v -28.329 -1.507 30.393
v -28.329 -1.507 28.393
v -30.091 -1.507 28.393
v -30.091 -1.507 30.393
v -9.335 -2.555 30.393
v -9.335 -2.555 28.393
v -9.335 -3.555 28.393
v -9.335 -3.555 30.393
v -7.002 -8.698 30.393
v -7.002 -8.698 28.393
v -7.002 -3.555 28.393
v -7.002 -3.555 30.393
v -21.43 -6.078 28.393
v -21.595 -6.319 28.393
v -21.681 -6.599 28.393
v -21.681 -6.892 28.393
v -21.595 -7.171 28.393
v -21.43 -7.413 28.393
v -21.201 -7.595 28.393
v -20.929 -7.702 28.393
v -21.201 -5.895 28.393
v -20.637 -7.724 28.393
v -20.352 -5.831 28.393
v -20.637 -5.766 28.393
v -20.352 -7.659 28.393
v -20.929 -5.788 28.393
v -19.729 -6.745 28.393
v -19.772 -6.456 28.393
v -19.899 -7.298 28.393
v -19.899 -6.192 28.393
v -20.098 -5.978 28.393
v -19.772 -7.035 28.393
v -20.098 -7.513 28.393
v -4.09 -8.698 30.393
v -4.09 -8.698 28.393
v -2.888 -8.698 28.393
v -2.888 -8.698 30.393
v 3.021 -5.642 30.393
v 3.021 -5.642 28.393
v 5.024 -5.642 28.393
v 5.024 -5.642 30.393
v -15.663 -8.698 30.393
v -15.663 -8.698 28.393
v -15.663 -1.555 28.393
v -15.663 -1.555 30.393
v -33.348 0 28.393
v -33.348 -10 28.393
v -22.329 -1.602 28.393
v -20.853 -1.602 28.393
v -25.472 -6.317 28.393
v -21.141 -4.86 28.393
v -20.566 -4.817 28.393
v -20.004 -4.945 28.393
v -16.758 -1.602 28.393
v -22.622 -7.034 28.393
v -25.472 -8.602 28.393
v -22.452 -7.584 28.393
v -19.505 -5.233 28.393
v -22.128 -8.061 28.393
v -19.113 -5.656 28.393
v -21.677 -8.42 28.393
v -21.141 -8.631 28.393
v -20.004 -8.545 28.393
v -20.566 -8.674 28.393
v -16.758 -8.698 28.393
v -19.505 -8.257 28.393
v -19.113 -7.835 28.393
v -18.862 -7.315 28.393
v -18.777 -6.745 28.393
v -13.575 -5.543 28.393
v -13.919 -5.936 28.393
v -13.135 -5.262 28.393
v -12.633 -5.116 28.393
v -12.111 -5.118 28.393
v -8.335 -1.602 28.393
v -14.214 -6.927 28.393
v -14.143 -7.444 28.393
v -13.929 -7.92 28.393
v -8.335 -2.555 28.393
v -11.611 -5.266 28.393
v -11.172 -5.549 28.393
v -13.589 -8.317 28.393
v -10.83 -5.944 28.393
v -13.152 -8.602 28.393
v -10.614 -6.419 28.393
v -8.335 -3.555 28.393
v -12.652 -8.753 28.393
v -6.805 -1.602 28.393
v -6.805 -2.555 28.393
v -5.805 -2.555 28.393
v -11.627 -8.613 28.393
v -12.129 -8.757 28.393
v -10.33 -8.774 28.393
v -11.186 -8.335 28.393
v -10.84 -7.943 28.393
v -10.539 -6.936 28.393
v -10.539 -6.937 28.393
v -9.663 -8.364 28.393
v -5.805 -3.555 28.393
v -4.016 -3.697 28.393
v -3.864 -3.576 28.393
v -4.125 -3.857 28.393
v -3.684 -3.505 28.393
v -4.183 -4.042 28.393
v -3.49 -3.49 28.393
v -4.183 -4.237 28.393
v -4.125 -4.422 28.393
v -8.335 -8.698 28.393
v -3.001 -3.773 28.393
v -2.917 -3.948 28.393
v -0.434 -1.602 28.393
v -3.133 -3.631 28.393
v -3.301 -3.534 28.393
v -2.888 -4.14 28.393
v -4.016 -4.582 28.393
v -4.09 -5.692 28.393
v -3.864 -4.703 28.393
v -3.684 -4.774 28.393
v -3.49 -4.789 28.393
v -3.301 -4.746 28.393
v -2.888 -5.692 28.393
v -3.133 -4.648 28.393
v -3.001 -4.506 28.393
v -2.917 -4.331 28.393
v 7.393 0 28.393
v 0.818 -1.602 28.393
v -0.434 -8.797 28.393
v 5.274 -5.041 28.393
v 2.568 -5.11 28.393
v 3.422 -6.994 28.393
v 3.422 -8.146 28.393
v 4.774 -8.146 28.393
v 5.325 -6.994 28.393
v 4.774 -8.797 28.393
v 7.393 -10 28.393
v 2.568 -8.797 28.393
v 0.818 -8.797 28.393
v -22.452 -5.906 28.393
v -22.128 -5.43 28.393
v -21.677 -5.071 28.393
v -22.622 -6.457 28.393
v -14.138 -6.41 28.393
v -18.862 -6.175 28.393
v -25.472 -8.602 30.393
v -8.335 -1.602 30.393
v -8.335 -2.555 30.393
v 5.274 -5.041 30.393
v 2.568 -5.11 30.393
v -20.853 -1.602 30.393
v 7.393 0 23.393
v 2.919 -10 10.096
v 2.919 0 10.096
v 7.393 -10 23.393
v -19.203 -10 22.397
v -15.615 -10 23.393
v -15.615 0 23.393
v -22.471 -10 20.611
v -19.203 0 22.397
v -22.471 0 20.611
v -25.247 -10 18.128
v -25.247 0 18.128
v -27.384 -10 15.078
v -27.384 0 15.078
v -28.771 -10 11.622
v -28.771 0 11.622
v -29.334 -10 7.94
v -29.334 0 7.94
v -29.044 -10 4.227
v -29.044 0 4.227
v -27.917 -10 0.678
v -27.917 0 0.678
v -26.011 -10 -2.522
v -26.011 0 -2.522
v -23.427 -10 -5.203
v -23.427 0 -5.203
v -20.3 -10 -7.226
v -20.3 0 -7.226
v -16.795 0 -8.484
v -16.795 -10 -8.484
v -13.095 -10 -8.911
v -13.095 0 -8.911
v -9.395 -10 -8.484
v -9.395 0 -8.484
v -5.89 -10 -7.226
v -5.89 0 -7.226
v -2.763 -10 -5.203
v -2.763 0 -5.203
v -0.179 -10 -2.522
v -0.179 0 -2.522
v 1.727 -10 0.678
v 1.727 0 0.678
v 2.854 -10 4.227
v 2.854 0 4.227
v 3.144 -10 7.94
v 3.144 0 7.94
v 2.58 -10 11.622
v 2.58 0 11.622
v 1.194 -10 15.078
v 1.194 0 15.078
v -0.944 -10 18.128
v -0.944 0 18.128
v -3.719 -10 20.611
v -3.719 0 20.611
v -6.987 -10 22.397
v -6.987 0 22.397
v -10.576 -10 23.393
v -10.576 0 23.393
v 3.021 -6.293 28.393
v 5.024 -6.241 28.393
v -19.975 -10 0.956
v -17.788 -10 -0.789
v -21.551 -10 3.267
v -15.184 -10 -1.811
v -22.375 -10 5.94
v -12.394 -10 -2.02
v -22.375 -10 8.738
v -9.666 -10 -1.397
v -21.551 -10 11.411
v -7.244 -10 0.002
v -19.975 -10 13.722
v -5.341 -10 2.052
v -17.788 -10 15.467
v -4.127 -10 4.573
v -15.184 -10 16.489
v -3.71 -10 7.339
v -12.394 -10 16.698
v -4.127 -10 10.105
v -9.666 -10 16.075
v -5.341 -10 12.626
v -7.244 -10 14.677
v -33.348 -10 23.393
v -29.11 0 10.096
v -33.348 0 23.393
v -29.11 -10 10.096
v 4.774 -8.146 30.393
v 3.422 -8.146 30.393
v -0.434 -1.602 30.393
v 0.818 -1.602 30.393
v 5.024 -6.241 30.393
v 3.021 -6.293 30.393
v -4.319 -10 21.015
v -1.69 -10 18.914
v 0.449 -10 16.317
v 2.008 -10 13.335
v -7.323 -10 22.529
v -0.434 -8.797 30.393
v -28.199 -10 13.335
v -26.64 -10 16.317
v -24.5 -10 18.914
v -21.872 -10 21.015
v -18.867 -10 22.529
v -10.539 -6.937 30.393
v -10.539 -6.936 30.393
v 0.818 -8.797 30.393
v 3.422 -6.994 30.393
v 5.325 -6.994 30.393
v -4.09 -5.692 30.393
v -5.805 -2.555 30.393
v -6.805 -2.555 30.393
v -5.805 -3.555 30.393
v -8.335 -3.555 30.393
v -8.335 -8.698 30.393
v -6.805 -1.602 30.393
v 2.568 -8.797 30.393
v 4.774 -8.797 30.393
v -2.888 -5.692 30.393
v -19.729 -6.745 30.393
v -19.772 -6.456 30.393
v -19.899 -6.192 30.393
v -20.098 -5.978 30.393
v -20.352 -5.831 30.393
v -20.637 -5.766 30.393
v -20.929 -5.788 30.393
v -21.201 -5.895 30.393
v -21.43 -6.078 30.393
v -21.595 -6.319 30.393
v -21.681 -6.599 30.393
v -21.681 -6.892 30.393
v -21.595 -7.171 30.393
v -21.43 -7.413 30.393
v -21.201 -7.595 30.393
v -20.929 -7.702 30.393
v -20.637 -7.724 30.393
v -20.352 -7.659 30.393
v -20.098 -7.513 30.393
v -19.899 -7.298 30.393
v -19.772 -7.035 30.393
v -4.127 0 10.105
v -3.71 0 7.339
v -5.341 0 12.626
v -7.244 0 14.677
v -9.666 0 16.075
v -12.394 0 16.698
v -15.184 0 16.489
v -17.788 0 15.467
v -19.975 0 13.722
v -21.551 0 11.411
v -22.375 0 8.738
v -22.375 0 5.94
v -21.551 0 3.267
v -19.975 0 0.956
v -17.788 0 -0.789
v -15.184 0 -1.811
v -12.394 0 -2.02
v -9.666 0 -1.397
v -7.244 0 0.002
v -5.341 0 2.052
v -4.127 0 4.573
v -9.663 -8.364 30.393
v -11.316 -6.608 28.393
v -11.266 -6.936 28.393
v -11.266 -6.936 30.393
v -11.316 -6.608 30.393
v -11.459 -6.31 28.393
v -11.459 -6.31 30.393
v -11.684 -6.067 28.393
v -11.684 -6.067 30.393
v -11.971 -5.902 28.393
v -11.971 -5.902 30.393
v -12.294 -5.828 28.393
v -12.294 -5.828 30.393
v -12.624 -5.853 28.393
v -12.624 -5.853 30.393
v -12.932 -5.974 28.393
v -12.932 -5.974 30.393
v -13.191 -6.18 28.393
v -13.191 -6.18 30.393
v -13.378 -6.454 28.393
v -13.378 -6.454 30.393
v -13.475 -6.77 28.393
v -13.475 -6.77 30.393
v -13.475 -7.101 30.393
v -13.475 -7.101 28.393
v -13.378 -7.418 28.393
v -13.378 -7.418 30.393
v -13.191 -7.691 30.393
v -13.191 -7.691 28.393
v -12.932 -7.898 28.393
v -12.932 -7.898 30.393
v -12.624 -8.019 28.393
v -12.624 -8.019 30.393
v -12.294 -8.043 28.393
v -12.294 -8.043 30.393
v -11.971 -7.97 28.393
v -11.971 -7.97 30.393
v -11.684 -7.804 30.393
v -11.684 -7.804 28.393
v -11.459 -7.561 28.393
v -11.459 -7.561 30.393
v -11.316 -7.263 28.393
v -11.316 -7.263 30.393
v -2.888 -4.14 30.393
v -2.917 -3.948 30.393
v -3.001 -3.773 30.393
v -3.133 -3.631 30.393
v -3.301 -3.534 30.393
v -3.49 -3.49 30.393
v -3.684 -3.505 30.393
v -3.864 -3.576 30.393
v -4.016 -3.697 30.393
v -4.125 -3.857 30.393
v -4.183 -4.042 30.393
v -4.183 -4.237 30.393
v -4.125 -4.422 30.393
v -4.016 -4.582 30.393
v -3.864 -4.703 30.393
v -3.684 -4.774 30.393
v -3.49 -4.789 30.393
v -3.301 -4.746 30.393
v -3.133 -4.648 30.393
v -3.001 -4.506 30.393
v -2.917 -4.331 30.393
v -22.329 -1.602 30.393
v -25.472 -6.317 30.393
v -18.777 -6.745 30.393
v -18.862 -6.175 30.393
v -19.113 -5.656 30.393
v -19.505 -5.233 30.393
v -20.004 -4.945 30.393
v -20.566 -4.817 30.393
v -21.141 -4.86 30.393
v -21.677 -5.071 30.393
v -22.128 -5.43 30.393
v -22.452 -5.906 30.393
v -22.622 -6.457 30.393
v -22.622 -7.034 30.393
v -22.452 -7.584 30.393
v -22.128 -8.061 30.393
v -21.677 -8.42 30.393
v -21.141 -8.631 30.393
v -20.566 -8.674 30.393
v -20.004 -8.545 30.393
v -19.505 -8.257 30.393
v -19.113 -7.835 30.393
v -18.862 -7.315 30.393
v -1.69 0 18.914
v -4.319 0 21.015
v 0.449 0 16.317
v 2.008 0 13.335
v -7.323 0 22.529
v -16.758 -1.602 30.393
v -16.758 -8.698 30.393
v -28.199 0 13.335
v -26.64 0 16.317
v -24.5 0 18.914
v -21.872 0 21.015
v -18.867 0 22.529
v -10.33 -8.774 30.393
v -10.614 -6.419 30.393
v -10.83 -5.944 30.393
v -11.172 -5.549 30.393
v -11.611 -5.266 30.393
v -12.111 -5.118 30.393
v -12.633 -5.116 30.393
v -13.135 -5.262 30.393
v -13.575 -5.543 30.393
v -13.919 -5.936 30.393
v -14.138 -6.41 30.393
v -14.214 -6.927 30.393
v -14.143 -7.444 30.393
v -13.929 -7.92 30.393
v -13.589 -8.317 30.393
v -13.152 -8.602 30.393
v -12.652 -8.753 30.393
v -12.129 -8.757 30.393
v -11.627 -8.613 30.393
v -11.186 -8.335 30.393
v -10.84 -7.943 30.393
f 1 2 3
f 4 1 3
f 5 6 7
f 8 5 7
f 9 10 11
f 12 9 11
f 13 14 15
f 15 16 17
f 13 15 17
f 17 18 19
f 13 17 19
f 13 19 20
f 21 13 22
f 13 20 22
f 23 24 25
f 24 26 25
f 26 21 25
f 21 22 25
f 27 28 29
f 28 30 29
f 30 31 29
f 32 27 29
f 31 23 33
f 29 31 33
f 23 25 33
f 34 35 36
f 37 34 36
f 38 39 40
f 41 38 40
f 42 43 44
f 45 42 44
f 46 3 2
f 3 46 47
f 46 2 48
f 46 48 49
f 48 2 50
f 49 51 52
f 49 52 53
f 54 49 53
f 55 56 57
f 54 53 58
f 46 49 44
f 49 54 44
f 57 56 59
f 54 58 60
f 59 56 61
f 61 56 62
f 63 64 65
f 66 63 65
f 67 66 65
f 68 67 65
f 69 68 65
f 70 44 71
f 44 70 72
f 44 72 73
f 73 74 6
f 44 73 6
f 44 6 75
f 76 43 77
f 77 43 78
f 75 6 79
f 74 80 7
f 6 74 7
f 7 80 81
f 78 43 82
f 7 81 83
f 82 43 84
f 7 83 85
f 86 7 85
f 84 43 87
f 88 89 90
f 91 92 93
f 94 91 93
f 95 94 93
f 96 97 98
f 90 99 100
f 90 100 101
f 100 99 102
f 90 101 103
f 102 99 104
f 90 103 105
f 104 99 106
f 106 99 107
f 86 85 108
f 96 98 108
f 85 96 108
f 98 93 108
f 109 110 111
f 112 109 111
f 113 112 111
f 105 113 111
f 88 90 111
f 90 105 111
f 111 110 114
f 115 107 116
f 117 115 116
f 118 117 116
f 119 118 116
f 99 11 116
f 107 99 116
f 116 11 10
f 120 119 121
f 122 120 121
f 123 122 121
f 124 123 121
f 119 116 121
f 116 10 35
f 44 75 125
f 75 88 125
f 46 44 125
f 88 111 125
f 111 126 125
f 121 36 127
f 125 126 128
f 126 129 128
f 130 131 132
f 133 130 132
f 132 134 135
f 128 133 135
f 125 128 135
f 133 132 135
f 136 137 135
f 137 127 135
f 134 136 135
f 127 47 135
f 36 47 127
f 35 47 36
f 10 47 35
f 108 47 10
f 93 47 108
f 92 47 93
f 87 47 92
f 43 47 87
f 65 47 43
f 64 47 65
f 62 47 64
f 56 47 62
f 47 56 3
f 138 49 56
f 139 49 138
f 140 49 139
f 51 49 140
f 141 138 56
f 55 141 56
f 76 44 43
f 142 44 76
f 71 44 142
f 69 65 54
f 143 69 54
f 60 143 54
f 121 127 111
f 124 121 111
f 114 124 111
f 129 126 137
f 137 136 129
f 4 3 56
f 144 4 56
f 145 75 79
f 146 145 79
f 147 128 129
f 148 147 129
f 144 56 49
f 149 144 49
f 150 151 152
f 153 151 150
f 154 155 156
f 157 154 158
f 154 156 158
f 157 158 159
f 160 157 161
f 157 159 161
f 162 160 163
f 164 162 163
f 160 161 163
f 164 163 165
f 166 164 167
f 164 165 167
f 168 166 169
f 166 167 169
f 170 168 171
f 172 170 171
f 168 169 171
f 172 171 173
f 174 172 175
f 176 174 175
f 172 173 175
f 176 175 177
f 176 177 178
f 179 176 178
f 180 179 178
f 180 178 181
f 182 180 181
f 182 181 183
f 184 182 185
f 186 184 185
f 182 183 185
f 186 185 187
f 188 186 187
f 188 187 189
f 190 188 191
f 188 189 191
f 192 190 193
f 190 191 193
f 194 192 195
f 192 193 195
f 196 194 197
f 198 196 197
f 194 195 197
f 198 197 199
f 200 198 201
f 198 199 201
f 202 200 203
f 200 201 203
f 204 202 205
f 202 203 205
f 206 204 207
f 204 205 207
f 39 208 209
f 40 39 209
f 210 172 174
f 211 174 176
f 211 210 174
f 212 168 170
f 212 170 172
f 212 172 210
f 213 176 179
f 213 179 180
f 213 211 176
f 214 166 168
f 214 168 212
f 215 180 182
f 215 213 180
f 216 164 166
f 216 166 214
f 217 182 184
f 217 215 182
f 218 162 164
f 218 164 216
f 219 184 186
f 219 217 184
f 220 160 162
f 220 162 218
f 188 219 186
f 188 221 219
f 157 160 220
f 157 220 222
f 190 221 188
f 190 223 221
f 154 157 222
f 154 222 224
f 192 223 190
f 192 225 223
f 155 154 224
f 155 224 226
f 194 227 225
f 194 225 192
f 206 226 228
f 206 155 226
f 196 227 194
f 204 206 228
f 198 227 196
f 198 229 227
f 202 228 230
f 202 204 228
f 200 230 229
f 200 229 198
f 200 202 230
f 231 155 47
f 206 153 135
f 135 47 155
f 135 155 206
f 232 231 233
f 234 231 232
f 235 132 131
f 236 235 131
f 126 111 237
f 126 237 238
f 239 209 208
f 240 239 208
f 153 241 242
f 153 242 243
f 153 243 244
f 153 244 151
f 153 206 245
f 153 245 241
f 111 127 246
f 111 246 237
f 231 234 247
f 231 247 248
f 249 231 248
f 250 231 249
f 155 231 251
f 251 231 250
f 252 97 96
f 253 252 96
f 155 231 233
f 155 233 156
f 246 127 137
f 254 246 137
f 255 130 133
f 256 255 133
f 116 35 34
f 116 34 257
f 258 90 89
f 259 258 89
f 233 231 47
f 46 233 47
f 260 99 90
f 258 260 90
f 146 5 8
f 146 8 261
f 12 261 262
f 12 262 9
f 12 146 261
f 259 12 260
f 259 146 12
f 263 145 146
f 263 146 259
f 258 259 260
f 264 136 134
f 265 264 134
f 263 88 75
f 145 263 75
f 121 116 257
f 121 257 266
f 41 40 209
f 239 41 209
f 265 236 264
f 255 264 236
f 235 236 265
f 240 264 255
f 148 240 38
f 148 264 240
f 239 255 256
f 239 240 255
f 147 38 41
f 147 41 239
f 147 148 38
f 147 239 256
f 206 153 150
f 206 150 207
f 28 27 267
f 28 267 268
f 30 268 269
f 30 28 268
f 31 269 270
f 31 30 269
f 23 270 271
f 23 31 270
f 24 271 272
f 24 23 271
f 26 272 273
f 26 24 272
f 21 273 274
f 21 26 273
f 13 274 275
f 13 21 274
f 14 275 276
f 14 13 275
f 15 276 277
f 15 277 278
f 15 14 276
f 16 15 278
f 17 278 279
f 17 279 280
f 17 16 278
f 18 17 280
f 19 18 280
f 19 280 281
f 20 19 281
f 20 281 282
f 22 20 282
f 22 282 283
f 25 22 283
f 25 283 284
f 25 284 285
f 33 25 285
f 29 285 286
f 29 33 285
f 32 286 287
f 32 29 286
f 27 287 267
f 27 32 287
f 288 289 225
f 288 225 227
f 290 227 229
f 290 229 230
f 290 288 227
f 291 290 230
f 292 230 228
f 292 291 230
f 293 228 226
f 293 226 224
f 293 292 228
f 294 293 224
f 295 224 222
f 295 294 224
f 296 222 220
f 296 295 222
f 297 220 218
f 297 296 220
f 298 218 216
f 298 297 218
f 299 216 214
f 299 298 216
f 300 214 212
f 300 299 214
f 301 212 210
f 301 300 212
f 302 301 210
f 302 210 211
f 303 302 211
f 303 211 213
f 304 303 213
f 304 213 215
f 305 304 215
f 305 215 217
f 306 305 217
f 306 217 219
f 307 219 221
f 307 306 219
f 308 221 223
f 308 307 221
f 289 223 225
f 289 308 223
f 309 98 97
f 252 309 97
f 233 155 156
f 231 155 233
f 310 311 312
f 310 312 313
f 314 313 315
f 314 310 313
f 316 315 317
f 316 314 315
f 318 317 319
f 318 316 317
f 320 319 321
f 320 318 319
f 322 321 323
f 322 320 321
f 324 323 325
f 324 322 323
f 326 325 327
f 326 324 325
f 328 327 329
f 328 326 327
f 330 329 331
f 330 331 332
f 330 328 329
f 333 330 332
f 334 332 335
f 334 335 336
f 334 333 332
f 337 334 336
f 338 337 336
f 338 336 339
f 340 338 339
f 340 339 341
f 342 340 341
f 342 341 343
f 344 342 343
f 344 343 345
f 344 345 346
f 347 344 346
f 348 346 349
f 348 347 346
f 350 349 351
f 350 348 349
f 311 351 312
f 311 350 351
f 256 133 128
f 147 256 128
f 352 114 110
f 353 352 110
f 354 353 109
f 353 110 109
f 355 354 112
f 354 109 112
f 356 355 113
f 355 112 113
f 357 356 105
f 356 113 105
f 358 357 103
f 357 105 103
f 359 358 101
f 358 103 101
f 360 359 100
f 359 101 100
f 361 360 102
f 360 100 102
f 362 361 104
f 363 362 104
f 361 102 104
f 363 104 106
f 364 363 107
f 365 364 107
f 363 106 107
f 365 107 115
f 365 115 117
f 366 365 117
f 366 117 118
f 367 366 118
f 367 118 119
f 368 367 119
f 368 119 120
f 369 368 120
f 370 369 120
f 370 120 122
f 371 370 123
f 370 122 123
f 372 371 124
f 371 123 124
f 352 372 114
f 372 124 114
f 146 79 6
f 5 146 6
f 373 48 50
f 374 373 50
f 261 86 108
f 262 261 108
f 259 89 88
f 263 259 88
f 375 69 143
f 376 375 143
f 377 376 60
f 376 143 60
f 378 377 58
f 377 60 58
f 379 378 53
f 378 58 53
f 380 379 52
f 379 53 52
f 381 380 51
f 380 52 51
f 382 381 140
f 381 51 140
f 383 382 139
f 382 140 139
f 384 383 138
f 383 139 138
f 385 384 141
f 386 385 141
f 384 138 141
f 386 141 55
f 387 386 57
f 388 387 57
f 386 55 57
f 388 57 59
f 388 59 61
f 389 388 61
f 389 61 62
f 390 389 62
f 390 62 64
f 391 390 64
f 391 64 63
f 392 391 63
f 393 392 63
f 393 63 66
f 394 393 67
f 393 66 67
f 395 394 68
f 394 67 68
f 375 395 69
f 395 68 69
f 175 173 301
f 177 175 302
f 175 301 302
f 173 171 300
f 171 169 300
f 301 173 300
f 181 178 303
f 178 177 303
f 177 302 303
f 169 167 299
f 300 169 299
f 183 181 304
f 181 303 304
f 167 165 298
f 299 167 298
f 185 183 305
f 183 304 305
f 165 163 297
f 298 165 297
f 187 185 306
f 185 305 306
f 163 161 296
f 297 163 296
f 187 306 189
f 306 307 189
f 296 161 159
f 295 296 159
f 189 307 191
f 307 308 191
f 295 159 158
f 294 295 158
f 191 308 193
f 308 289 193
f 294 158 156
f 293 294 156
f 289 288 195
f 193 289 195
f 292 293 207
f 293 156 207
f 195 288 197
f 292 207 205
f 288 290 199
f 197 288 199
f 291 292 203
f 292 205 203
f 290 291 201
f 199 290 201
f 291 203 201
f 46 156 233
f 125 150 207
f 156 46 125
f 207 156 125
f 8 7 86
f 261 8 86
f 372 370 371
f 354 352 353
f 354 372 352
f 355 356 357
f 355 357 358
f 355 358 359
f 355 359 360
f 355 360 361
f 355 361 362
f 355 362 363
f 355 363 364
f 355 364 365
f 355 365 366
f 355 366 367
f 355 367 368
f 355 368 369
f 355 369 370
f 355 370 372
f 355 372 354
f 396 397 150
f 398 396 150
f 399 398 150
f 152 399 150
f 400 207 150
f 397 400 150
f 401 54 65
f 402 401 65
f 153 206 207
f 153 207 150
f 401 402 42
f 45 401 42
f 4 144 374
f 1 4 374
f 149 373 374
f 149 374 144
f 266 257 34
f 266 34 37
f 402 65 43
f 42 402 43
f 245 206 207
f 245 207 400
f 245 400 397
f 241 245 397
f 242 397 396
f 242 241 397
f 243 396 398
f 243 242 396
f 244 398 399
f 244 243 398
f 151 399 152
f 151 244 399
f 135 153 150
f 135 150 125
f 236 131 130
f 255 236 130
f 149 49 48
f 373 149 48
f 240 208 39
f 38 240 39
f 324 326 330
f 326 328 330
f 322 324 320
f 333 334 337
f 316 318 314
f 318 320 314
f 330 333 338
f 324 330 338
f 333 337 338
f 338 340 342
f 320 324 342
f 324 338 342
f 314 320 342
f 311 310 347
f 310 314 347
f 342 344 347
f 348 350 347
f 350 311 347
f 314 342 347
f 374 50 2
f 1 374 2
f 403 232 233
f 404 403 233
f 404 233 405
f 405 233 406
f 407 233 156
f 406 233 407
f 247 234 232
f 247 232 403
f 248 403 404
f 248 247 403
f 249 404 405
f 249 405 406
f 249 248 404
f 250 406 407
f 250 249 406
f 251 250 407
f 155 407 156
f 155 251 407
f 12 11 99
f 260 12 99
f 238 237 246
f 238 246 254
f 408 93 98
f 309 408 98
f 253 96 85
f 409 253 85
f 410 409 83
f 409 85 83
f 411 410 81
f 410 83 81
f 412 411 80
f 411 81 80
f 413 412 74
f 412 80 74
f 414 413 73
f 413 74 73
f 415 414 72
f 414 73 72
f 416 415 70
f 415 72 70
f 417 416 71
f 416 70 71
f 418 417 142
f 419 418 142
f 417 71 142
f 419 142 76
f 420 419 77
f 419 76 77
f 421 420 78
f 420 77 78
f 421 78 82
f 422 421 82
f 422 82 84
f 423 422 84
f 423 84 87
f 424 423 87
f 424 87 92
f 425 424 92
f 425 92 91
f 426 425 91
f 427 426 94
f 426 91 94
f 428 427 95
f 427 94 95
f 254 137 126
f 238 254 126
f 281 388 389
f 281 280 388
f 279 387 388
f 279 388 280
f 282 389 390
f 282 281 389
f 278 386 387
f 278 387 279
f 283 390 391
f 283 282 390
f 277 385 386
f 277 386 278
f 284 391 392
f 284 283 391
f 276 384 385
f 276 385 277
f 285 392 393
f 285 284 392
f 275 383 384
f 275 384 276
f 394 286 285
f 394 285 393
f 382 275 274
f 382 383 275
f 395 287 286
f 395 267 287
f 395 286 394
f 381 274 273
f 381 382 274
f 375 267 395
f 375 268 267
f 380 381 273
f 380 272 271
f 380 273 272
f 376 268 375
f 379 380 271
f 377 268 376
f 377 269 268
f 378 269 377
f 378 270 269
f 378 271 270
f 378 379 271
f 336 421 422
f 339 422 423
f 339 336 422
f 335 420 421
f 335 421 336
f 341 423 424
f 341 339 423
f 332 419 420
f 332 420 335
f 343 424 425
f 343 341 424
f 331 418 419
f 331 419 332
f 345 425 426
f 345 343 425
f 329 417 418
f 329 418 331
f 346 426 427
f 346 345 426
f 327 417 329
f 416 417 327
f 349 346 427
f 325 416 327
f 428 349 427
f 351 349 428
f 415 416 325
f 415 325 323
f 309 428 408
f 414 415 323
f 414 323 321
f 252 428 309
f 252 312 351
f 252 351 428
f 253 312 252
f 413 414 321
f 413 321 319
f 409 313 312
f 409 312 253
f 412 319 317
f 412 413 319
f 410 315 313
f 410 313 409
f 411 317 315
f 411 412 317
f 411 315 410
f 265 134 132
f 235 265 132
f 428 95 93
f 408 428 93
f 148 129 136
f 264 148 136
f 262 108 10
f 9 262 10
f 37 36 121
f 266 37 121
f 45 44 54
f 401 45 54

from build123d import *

# Parameters (mm, degrees)
F0_R     = 16.25
F0_R_2   = 9.385
F1_DEPTH = 10
F2_W     = 40.7407447589
F2_H     = 5
F3_DEPTH = 10
F4_R     = 1.9337093682
F4_R_2   = 0.9816924099
F4_R_3   = 1.1106573772
F4_W     = 1.2018270791
F4_H     = 3.0057999915
F4_R_4   = 0.6509895902
F4_W_2   = 1.2519030424
F4_H_2   = 7.1941594385
F5_DEPTH = 2
F7_DEPTH = 10


with BuildPart() as f1:
    # F0 (on Front) → F1 (new body)
    with BuildSketch(Plane.XZ):
        with Locations((-13.0951609462, 7.3390468024)):
            Circle(F0_R)
        with Locations((-13.0951609462, 7.3390468024)):
            Circle(F0_R_2, mode=Mode.SUBTRACT)
    extrude(amount=F1_DEPTH)

    # F2 (on face) → F3 (join)
    with BuildSketch(Plane.XZ.offset(10)):
        with Locations((-12.9778040573, 25.8925622329)):
            Rectangle(F2_W, F2_H)
    extrude(amount=-F3_DEPTH)

    # F4 (on face) → F5 (join)
    with BuildSketch(Plane.XY.offset(28.3925622329)):
        Polygon((-28.3292634413, -1.5072070747), (-30.0911674652, -1.5072070747), (-25.4721205841, -8.6024456866), (-20.8530719319, -1.6024449117), (-22.3292625557, -1.6024449117), (-25.4721205841, -6.3167309581), align=None)
        with Locations((-20.7102152318, -6.7453023866)):
            Circle(F4_R)
        with Locations((-20.7102152318, -6.7453023866)):
            Circle(F4_R_2, mode=Mode.SUBTRACT)
        Polygon((-15.6625955938, -1.5548256058), (-16.7578335414, -1.6024449117), (-16.7578335414, -8.697684077), (-15.6625955938, -8.697684077), align=None)
        with BuildLine():
            ThreePointArc((-10.5393779229, -6.9366346274), (-10.5393777734, -6.9362066761), (-10.5393777235, -6.9357787247))
            ThreePointArc((-10.5393777235, -6.9357787247), (-14.1375755871, -6.41006788), (-10.8401901532, -7.9432505364))
            ThreePointArc((-10.8401901532, -7.9432505364), (-10.6163086283, -7.461899618), (-10.5393779229, -6.9366346274))
        make_face()
        with Locations((-12.3768808653, -6.9357787247)):
            Circle(F4_R_3, mode=Mode.SUBTRACT)
        with BuildLine():
            ThreePointArc((-10.5393779229, -6.9366346274), (-10.6163086283, -7.461899618), (-10.8401901532, -7.9432505364))
            Line((-10.8401901532, -7.9432505364), (-10.3299132729, -8.7741625592))
            Line((-10.3299132729, -8.7741625592), (-9.6625938225, -8.3643505961))
            Line((-9.6625938225, -8.3643505961), (-10.5393779229, -6.9366346274))
        make_face()
        Polygon((-6.805451851, -1.6024449117), (-8.3352142721, -1.6024449117), (-8.3352142721, -2.5548260486), (-9.3352142721, -2.5548260486), (-9.3352142721, -3.5548260486), (-8.3352142721, -3.5548260486), (-8.3352142721, -8.697684077), (-7.001881234, -8.697684077), (-7.001881234, -3.5548260486), (-5.805451851, -3.5548260486), (-5.805451851, -2.5548260486), (-6.805451851, -2.5548260486), align=None)
        with Locations((-3.4888256341, -7.1947840813)):
            Rectangle(F4_W, F4_H)
        with Locations((-3.5389016848, -4.1395234875)):
            Circle(F4_R_4)
        with Locations((0.1917704794, -5.1995246309)):
            Rectangle(F4_W_2, F4_H_2)
        Polygon((2.5683134807, -8.7966043502), (4.7737364657, -8.7966043502), (4.7737364657, -8.1456145272), (3.4216814674, -8.1456145272), (3.4216814674, -6.993863266), (5.3245741874, -6.993863266), (5.2744979039, -5.0408942625), (2.5683134807, -5.1102838218), align=None)
        Polygon((3.0210714322, -6.2927971594), (3.0210714322, -5.6418073364), (5.0241174176, -5.6418073364), (5.0241174176, -6.2414368467), align=None, mode=Mode.SUBTRACT)
    extrude(amount=F5_DEPTH)


with BuildPart() as f7:
    # F6 (on face) → F7 (new body)
    with BuildSketch(Plane.XZ.offset(10)):
        with BuildLine():
            Line((-15.6145144985, 23.3925622329), (-33.3481764367, 23.3925622329))
            Line((-33.3481764367, 23.3925622329), (-29.1096384632, 10.0956769657))
            ThreePointArc((-29.1096384632, 10.0956769657), (-24.5003138597, 18.9142352251), (-15.6145144985, 23.3925622329))
        make_face()
    extrude(amount=-F7_DEPTH)


with BuildPart() as f7b:
    # F6 (on face) → F7, piece 2 (new body)
    with BuildSketch(Plane.XZ.offset(10)):
        with BuildLine():
            ThreePointArc((-10.575807394, 23.3925622329), (-1.6900080328, 18.9142352251), (2.9193165707, 10.0956769657))
            Line((2.9193165707, 10.0956769657), (7.3925683221, 23.3925622329))
            Line((7.3925683221, 23.3925622329), (-10.575807394, 23.3925622329))
        make_face()
    extrude(amount=-F7_DEPTH)


solid = Compound([f1.part, f7.part, f7b.part])
